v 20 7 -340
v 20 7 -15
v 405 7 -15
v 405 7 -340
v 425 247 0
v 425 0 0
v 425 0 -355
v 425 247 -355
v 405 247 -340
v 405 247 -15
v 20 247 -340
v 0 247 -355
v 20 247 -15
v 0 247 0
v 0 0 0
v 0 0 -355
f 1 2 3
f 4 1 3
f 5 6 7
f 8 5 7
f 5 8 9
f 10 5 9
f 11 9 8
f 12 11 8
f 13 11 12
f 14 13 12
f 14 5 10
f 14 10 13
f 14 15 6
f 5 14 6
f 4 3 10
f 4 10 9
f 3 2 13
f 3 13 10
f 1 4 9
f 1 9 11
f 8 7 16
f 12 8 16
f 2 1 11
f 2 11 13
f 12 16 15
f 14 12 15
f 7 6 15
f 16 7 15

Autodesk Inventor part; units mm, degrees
ref_plane "YZ Plane" through (0, 0, 0) normal (1, 0, 0) x (0, 1, 0)
ref_plane "XZ Plane" through (0, 0, 0) normal (0, 1, 0) x (-1, 0, 0)
ref_plane "XY Plane" through (0, 0, 0) normal (0, 0, 1) x (1, 0, 0)
sketch "Sketch1" plane through (0, 0, 0) normal (0, 1, 0) x (-1, 0, 0)
  line L0 (0, 0) -> (-425, 0)
  line L1 (-425, 0) -> (-425, -355)
  line L2 (-425, -355) -> (0, -355)
  line L3 (0, -355) -> (0, 0)
  line L4 (-20, -15) -> (-405, -15)
  line L5 (-405, -15) -> (-405, -340)
  line L6 (-405, -340) -> (-20, -340)
  line L7 (-20, -340) -> (-20, -15)
  dimension "d0" = 425
  dimension "d1" = 355
  dimension "d2" = 385
  dimension "d3" = 325
extrude "Extrusion1" add sketch "Sketch1" along normal blind 247
sketch "Sketch2" plane through (0, 0, 0) normal (0, -1, 0) x (1, 0, 0)
  line L0 (0, -355) -> (0, 0) projected
  line L1 (425, 0) -> (425, -355) projected
  line L2 (0, 0) -> (425, 0)
  line L3 (425, 0) -> (425, -355)
  line L4 (425, -355) -> (0, -355)
  line L5 (0, -355) -> (0, 0)
extrude "Extrusion2" add sketch "Sketch2" against normal blind 7
sketch "Sketch3" plane through (20, 247, -15) normal (1, 0, 0) x (0, 0, -1)
  line L0 (0, -240) -> (325, -240) projected
  line L1 (0, -240) -> (162.5, -240)
  point P0 (-15, -247)
  dimension "d8" = 162.5
sketch "Sketch4" plane through (405, 247, -340) normal (-1, 0, 0) x (0, 0, 1)
  point P0 (340, -247)
sketch "Sketch5" plane through (405, 247, -340) normal (-1, 0, 0) x (0, 0, 1)
  line L0 (325, -240) -> (0, -240) projected
  line L1 (325, -240) -> (162.5, -240)
  point P0 (340, -247)
sketch "Sketch6" plane through (405, 247, -340) normal (-1, 0, 0) x (0, 0, 1)
  line L0 (0, -240) -> (325, -240) projected
  line L1 (325, -240) -> (162.5, -240)
  point P0 (340, -247)
  dimension "d9" = 162.5
properties part number "Olkasse"
